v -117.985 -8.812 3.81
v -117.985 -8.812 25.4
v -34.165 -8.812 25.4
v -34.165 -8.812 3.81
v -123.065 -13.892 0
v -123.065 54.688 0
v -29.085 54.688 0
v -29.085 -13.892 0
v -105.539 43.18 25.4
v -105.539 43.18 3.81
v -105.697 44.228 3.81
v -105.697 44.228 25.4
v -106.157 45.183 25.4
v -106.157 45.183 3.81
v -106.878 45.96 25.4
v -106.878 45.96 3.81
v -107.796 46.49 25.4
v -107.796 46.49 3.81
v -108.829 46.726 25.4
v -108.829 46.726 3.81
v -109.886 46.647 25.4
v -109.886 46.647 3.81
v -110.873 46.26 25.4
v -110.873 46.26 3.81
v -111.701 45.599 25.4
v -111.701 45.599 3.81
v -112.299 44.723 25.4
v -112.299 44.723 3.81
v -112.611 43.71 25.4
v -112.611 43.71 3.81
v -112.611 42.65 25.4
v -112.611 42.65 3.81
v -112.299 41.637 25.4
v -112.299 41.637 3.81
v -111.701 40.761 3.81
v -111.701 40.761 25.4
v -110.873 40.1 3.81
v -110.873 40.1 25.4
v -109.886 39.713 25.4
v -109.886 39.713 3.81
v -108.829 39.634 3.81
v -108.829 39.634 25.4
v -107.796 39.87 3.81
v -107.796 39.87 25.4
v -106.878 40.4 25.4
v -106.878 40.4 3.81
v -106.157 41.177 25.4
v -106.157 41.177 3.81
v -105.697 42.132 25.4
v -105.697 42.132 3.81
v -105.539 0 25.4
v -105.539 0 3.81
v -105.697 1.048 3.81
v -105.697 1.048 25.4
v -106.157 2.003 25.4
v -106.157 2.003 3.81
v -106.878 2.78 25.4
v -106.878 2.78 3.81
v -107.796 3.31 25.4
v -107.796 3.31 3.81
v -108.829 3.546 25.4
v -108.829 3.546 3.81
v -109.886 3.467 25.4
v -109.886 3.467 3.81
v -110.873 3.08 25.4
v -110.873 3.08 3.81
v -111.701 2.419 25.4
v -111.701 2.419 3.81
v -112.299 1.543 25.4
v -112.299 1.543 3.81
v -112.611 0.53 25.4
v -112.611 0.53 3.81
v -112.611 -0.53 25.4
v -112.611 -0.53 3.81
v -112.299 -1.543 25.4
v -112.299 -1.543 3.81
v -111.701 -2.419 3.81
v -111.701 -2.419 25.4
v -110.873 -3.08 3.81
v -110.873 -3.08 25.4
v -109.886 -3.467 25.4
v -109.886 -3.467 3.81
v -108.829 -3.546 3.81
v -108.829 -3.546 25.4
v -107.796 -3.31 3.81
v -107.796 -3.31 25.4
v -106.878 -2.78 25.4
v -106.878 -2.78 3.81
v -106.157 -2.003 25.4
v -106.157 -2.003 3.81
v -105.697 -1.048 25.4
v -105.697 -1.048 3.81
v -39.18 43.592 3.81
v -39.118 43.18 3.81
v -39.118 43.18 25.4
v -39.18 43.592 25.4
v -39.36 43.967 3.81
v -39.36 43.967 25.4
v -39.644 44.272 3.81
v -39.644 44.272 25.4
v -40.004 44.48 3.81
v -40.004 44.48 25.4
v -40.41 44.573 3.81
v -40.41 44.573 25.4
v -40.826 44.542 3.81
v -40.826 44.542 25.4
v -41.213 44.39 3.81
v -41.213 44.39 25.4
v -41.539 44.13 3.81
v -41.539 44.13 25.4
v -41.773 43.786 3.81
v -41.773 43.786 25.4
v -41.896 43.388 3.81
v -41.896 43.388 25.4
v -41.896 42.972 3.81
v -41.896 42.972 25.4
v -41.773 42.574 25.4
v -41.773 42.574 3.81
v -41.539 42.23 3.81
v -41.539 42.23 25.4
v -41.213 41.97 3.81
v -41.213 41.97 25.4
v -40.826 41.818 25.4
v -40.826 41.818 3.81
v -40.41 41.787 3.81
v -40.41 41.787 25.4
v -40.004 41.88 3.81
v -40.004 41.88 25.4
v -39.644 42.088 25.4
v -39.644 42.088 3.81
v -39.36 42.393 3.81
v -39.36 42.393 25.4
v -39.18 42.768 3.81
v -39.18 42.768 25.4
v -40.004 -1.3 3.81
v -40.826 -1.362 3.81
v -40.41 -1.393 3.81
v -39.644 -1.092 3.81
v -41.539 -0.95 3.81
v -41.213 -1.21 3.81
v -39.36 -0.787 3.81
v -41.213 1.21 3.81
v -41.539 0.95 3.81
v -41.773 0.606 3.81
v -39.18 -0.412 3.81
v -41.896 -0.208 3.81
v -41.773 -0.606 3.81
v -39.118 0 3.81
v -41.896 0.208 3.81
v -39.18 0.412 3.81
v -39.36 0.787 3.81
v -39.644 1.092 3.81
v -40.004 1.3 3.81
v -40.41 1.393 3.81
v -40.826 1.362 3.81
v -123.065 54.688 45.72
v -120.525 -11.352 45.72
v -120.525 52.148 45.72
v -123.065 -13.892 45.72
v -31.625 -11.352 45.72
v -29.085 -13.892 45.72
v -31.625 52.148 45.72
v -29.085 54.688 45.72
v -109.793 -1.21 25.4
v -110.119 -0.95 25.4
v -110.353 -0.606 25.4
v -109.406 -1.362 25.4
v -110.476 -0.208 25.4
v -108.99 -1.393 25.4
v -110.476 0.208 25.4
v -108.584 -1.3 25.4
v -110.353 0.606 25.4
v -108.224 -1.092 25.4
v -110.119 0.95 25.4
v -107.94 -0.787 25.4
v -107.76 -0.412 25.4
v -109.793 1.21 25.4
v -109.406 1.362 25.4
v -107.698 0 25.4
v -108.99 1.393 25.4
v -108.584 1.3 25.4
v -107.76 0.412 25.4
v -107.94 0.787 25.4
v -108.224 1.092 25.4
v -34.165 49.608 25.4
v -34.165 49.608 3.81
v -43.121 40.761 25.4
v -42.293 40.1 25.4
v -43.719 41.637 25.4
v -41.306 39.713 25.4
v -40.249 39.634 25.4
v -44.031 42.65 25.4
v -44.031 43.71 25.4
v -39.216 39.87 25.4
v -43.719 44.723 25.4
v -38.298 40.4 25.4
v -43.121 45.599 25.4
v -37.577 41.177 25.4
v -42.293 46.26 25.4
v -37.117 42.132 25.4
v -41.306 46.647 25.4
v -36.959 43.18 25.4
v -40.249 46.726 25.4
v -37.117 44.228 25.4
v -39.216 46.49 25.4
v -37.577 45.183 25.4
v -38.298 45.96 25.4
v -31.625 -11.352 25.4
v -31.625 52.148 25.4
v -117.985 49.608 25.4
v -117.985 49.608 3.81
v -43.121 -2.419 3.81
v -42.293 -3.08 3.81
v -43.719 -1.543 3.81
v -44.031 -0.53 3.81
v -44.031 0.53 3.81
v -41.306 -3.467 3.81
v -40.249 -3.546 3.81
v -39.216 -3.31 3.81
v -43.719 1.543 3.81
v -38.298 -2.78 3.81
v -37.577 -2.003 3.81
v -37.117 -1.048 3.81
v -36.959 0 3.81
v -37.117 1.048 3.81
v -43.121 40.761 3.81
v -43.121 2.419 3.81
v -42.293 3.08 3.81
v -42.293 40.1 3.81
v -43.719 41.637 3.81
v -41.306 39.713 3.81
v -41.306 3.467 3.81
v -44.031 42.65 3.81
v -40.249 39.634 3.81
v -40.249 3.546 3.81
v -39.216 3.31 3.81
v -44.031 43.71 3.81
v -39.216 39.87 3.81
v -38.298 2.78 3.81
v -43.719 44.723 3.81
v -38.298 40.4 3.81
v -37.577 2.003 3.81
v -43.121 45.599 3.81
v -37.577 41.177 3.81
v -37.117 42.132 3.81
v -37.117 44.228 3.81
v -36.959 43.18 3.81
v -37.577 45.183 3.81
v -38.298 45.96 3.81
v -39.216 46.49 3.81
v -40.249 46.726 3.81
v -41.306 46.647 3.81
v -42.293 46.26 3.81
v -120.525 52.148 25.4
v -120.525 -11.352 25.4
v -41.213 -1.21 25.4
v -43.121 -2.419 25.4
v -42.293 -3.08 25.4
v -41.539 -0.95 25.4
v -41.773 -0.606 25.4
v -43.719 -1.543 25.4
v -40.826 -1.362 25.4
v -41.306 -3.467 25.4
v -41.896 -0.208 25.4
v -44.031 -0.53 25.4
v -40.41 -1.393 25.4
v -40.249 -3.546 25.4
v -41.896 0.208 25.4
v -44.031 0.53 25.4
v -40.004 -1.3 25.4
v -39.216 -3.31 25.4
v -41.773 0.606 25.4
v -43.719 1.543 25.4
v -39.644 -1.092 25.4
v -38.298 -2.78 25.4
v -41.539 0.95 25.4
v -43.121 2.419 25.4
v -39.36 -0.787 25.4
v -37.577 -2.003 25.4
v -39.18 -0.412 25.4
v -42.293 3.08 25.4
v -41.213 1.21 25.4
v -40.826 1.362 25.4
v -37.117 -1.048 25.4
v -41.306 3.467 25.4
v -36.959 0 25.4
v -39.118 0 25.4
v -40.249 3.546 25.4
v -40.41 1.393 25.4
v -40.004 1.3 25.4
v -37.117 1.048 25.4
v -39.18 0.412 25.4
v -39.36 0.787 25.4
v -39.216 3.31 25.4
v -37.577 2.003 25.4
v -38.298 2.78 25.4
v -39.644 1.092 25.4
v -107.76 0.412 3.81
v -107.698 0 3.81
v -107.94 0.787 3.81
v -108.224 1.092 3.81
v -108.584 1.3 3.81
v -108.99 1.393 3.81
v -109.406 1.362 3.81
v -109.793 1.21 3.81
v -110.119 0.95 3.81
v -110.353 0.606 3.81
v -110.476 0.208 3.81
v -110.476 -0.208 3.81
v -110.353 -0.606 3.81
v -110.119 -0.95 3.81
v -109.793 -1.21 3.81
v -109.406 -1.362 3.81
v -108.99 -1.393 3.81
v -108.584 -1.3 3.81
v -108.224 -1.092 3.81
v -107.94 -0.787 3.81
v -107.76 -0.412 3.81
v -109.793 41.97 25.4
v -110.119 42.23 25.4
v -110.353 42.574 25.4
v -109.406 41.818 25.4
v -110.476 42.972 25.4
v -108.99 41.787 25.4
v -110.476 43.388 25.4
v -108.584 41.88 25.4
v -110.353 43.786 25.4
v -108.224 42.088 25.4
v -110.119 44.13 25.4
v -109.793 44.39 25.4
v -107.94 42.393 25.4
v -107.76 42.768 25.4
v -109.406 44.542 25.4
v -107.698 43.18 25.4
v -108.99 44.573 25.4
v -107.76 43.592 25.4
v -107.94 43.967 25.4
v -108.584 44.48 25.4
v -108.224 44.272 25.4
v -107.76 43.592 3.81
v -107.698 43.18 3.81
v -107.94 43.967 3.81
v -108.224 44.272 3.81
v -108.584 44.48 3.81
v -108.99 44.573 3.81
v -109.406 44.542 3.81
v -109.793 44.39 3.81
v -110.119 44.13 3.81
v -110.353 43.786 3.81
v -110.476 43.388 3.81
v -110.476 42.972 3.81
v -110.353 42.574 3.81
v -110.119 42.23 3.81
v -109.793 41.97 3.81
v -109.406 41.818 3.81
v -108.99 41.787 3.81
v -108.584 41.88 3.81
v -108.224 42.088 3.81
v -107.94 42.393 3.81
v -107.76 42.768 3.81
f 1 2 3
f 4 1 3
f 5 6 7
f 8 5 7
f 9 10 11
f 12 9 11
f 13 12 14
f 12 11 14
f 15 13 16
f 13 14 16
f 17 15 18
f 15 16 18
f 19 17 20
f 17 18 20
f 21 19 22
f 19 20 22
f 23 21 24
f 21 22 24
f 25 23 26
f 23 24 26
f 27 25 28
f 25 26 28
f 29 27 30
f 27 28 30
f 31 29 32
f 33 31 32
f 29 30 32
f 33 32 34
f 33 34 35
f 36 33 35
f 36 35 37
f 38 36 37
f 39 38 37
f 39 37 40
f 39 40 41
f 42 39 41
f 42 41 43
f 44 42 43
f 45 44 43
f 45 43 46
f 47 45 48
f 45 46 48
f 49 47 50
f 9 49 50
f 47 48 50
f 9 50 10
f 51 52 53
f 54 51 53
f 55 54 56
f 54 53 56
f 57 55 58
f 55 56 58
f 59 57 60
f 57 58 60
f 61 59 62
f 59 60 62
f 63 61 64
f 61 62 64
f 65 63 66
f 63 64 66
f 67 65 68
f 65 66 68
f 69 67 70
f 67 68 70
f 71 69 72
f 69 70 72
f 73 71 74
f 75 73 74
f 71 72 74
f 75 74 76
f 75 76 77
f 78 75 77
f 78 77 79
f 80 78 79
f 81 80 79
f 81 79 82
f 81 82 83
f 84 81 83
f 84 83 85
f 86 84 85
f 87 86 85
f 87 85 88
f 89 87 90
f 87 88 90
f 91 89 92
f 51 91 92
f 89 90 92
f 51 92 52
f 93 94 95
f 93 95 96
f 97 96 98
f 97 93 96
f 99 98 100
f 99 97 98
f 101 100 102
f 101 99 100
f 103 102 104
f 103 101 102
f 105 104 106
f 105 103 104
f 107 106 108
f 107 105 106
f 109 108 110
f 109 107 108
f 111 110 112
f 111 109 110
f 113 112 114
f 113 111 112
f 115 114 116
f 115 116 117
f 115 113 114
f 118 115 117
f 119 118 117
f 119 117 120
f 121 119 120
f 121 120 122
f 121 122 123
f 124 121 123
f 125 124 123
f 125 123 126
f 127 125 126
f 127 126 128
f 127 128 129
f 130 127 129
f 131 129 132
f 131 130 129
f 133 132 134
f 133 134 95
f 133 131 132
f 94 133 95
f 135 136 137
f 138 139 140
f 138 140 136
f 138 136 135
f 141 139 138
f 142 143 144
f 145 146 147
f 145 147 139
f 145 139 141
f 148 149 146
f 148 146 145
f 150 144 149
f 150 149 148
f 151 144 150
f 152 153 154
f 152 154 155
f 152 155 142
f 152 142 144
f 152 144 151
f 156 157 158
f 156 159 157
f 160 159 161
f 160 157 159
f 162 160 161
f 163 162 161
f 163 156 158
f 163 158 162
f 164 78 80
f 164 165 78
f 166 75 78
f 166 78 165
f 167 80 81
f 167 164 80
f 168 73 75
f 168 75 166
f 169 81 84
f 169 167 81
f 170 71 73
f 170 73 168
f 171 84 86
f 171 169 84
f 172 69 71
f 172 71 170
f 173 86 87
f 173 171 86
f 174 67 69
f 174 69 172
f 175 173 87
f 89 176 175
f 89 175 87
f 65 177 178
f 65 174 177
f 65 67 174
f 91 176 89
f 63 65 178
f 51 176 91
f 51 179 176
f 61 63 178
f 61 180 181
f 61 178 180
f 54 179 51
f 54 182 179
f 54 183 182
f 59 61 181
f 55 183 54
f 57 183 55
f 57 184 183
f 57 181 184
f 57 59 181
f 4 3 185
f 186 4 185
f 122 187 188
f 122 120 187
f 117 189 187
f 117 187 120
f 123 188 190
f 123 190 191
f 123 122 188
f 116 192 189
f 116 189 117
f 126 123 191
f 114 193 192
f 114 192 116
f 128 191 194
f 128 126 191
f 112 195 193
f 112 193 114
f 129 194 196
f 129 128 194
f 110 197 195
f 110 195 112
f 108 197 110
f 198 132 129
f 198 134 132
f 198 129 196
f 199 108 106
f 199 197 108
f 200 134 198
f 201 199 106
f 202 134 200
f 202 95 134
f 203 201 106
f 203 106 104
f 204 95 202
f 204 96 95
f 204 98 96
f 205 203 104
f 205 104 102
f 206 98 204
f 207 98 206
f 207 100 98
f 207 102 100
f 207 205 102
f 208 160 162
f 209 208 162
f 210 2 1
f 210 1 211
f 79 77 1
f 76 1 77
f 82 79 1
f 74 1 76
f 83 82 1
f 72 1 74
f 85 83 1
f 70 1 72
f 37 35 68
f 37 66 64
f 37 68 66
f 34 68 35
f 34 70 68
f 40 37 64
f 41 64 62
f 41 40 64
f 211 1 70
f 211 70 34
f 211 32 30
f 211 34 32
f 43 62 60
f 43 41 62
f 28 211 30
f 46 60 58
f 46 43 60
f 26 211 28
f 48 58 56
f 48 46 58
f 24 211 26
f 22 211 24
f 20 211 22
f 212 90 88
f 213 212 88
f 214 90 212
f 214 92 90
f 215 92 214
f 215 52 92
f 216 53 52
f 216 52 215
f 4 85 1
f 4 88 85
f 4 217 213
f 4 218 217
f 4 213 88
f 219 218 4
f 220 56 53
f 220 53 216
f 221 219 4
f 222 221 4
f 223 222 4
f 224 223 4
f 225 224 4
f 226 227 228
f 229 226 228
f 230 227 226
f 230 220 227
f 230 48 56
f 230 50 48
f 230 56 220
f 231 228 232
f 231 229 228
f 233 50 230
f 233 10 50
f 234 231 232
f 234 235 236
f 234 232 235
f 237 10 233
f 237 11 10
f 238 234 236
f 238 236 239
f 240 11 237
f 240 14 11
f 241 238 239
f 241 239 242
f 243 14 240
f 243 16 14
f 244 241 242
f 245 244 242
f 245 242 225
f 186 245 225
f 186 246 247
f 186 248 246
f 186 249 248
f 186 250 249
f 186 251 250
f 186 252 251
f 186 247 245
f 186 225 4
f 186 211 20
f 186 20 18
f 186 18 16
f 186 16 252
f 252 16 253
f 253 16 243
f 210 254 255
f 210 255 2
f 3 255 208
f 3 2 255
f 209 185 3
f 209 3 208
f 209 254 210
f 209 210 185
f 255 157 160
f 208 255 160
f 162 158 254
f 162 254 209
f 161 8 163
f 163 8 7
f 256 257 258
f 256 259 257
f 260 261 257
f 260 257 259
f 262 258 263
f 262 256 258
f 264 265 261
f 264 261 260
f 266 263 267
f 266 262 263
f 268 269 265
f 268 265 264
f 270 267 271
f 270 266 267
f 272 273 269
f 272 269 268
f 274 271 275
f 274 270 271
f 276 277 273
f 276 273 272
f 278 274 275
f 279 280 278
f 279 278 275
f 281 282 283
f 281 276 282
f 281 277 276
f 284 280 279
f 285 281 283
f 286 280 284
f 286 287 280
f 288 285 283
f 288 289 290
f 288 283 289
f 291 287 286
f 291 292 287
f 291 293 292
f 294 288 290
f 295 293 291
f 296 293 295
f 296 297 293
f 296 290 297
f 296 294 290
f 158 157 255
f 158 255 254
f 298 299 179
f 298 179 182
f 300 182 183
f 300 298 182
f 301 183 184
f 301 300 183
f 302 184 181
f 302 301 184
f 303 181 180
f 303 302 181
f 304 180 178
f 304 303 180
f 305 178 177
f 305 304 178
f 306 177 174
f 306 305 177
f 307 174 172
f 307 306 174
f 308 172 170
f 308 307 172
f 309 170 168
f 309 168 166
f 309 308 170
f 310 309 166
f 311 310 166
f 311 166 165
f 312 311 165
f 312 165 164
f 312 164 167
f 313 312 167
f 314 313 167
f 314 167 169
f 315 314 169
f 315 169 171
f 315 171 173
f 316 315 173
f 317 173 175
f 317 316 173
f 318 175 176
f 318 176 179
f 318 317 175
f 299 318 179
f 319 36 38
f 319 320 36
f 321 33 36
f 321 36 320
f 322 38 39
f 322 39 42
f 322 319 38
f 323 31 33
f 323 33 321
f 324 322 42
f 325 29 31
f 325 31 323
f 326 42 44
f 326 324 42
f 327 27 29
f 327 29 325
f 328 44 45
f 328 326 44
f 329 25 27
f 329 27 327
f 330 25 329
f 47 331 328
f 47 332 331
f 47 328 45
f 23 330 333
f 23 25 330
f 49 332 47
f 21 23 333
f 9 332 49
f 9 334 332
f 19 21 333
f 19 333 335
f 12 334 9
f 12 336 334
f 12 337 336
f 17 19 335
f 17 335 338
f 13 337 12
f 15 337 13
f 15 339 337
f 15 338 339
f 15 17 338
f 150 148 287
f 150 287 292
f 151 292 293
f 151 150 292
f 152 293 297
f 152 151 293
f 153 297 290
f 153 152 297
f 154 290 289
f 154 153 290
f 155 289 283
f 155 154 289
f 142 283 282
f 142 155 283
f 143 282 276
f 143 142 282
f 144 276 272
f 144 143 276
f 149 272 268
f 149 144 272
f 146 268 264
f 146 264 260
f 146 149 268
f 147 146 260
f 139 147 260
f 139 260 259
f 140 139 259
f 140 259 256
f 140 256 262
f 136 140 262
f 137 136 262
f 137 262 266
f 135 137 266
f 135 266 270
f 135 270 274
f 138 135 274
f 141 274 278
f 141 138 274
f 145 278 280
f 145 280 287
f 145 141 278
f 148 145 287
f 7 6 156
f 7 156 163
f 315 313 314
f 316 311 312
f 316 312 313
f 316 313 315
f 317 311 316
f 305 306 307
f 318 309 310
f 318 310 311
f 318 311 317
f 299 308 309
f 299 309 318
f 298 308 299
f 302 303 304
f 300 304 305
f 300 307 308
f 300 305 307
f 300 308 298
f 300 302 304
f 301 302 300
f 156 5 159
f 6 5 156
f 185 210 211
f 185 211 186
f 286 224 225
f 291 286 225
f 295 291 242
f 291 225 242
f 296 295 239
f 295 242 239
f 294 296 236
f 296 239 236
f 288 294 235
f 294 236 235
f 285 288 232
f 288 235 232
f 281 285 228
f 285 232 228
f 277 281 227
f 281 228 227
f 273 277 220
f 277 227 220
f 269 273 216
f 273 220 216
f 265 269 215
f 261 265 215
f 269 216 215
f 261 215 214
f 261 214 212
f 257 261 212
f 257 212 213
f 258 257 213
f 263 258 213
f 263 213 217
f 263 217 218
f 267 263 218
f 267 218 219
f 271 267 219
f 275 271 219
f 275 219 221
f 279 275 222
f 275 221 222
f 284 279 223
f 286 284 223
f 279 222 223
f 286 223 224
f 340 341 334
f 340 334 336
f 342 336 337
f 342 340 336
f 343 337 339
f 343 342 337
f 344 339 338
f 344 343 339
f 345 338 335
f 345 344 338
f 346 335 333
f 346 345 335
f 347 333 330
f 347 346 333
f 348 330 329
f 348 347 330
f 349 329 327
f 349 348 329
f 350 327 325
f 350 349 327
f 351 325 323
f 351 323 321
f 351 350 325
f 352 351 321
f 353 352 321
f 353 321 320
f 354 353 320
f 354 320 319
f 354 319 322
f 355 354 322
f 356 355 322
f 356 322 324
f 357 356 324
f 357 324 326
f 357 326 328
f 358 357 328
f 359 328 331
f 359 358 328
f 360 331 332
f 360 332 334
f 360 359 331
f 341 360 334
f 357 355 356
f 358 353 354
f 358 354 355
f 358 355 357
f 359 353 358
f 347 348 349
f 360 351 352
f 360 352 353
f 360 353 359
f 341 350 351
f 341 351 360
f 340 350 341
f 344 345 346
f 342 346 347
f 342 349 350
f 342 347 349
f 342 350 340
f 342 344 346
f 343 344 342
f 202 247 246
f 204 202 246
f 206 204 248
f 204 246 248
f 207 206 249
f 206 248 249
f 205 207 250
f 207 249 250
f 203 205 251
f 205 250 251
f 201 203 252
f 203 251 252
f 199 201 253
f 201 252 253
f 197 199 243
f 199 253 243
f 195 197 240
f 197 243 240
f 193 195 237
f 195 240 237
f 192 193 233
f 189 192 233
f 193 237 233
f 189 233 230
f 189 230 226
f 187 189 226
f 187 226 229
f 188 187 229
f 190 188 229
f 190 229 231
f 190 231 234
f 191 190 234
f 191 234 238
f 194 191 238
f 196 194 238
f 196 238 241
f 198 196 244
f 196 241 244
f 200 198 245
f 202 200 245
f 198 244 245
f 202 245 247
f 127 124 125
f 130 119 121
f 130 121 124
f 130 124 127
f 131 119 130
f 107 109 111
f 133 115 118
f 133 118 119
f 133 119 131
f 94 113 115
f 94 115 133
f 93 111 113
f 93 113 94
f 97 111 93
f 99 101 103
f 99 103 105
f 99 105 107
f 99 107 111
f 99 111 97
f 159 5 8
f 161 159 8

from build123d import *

# Parameters (mm, degrees)
F0_W     = 93.98
F0_H     = 68.58
F1_DEPTH = 45.72
F2_W     = 83.82
F2_H     = 58.42
F3_DEPTH = 41.91
F4_R     = 3.556
F4_R_2   = 1.397
F5_DEPTH = 21.59
F6_W     = 88.9
F6_H     = 63.5
F7_DEPTH = 20.32


with BuildPart() as f1:
    # F0 (on Top) → F1 (new body)
    with BuildSketch(Plane.XY):
        with Locations((-76.07475, 20.398488)):
            Rectangle(F0_W, F0_H)
    extrude(amount=F1_DEPTH)

    # F2 (on face) → F3 (cut)
    with BuildSketch(Plane.XY.offset(45.72)):
        with Locations((-76.07475, 20.398488)):
            Rectangle(F2_W, F2_H)
    extrude(amount=-F3_DEPTH, mode=Mode.SUBTRACT)

    # F4 (on face) → F5 (join)
    with BuildSketch(Plane.XY.offset(3.81)):
        with Locations((-109.09475, 43.18)):
            Circle(F4_R)
        with Locations((-109.09475, 43.18)):
            Circle(F4_R_2, mode=Mode.SUBTRACT)
        with Locations((-40.51475, 43.18)):
            Circle(F4_R)
        with Locations((-40.51475, 43.18)):
            Circle(F4_R_2, mode=Mode.SUBTRACT)
        with Locations((-109.09475, 0)):
            Circle(F4_R)
        with Locations((-109.09475, 0)):
            Circle(F4_R_2, mode=Mode.SUBTRACT)
        with Locations((-40.51475, 0)):
            Circle(F4_R)
        with Locations((-40.51475, 0)):
            Circle(F4_R_2, mode=Mode.SUBTRACT)
    extrude(amount=F5_DEPTH)

    # F6 (on face) → F7 (cut)
    with BuildSketch(Plane.XY.offset(45.72)):
        with Locations((-76.07475, 20.398488)):
            Rectangle(F6_W, F6_H)
    extrude(amount=-F7_DEPTH, mode=Mode.SUBTRACT)


solid = f1.part
